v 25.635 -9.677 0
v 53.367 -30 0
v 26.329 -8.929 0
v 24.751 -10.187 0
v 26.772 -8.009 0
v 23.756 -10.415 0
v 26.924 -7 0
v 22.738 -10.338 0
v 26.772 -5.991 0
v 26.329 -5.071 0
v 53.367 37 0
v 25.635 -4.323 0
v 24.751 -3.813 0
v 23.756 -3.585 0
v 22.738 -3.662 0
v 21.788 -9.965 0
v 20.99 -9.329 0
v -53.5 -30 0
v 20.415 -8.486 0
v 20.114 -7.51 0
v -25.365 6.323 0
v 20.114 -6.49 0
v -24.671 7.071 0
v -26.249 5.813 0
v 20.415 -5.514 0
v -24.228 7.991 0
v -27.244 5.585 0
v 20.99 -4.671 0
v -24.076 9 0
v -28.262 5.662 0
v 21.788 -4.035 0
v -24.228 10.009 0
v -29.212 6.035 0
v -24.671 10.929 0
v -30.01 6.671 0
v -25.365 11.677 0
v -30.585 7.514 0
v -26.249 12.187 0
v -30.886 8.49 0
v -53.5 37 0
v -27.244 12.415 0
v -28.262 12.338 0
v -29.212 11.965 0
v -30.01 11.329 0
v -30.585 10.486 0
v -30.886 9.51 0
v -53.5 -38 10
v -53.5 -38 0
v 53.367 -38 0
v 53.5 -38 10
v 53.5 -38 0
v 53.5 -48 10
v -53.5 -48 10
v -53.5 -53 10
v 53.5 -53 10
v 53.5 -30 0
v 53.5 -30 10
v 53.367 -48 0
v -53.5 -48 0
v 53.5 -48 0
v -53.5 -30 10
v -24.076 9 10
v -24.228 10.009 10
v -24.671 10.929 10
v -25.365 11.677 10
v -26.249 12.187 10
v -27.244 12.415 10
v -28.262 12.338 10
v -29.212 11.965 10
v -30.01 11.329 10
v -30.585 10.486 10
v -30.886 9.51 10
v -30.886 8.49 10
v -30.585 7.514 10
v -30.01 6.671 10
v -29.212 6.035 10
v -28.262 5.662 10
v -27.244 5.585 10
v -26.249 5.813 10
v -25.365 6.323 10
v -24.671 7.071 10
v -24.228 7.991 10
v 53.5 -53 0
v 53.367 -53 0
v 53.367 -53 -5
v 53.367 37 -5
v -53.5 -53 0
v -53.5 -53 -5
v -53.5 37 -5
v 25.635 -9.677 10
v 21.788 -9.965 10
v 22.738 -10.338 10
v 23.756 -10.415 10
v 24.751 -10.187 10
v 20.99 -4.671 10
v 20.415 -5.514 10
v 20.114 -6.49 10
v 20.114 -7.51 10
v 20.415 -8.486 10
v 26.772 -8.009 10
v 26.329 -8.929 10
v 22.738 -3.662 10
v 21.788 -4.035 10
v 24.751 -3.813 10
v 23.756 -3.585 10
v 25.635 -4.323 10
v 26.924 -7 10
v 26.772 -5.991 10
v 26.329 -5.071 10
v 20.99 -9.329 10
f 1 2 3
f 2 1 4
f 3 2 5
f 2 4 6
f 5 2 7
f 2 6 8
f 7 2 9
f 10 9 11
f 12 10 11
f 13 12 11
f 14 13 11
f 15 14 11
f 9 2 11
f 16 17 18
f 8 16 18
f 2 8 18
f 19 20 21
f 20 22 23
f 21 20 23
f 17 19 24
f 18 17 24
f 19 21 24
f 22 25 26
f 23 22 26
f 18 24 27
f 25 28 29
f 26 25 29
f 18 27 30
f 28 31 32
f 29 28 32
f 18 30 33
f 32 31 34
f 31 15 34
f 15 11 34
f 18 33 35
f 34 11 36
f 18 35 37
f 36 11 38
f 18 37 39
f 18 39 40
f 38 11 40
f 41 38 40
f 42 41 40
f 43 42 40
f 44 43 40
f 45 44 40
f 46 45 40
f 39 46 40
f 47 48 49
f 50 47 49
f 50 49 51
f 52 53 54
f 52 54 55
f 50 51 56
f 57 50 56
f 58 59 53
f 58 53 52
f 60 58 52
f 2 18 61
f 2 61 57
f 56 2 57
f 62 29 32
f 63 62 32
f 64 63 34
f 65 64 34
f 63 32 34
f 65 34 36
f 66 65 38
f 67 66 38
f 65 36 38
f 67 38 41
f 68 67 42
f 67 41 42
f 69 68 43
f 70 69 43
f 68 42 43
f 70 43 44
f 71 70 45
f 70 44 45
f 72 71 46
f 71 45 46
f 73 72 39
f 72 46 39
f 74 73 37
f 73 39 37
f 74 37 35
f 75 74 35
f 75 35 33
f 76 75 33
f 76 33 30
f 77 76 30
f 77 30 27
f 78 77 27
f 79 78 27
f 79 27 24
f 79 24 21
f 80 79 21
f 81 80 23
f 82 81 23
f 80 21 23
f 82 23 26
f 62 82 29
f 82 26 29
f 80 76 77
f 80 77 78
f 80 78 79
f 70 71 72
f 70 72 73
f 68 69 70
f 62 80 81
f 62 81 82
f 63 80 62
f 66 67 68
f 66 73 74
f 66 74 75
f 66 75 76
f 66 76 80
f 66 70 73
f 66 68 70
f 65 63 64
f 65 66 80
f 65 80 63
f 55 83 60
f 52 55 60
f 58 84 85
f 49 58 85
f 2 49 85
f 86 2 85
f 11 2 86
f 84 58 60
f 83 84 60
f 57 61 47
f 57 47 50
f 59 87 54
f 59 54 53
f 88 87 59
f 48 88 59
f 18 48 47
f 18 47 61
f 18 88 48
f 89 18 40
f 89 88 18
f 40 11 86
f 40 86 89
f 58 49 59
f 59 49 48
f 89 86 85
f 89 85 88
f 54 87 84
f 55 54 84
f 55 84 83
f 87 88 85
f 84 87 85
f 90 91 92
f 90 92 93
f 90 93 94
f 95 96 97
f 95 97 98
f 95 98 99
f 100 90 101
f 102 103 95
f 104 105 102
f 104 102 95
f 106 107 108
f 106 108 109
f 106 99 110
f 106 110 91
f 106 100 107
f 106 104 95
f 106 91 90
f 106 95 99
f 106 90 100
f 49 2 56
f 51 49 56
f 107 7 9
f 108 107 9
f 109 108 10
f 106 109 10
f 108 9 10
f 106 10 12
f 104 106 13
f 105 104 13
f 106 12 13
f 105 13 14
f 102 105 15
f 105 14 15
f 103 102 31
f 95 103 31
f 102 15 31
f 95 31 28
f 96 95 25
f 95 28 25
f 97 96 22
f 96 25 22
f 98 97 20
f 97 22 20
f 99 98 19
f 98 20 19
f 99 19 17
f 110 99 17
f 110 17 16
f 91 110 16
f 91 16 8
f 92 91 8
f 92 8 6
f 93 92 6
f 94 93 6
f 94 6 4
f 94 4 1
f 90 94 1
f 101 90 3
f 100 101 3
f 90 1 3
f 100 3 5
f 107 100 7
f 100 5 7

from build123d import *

# Parameters (mm, degrees)
SKETCH1_R             = 3.424139869
BOSS_EXTRUDE1_DEPTH   = 10
BOSS_EXTRUDE1_2_DEPTH = 10
SKETCH2_W             = 106.866754861
SKETCH2_H             = 90
BOSS_EXTRUDE2_DEPTH   = 5
SKETCH3_W             = 107
SKETCH3_H             = 5
BOSS_EXTRUDE3_DEPTH   = 10
SKETCH4_W             = 107
SKETCH4_H             = 8
BOSS_EXTRUDE4_DEPTH   = 10


with BuildPart() as part:
    # Sketch1 → Boss-Extrude1 (new body)
    with BuildSketch(Plane.XY):
        with Locations((-27.5, 9)):
            Circle(SKETCH1_R)
    extrude(amount=BOSS_EXTRUDE1_DEPTH)



with BuildPart() as body_2:
    # Sketch1 → Boss-Extrude1 2 (new body)
    with BuildSketch(Plane.XY):
        with Locations((23.5, -7)):
            Circle(SKETCH1_R)
    extrude(amount=BOSS_EXTRUDE1_2_DEPTH)


with BuildPart() as part_1:
    add(part.part)

    add(body_2.part)  # Boss-Extrude2 merges body 2
    # Sketch2 → Boss-Extrude2 (add)
    with BuildSketch(Plane(origin=(0, 0, 0), x_dir=(-1, 0, 0), z_dir=(0, 0, -1))):
        with Locations((0.066622569, -8)):
            Rectangle(SKETCH2_W, SKETCH2_H)
    extrude(amount=BOSS_EXTRUDE2_DEPTH)

    # Sketch3 → Boss-Extrude3 (add)
    with BuildSketch(Plane.XY):
        with Locations((0, -50.5)):
            Rectangle(SKETCH3_W, SKETCH3_H)
    extrude(amount=BOSS_EXTRUDE3_DEPTH)

    # Sketch4 → Boss-Extrude4 (add)
    with BuildSketch(Plane.XY):
        with Locations((0, -34)):
            Rectangle(SKETCH4_W, SKETCH4_H)
    extrude(amount=BOSS_EXTRUDE4_DEPTH)


solid = part_1.part
